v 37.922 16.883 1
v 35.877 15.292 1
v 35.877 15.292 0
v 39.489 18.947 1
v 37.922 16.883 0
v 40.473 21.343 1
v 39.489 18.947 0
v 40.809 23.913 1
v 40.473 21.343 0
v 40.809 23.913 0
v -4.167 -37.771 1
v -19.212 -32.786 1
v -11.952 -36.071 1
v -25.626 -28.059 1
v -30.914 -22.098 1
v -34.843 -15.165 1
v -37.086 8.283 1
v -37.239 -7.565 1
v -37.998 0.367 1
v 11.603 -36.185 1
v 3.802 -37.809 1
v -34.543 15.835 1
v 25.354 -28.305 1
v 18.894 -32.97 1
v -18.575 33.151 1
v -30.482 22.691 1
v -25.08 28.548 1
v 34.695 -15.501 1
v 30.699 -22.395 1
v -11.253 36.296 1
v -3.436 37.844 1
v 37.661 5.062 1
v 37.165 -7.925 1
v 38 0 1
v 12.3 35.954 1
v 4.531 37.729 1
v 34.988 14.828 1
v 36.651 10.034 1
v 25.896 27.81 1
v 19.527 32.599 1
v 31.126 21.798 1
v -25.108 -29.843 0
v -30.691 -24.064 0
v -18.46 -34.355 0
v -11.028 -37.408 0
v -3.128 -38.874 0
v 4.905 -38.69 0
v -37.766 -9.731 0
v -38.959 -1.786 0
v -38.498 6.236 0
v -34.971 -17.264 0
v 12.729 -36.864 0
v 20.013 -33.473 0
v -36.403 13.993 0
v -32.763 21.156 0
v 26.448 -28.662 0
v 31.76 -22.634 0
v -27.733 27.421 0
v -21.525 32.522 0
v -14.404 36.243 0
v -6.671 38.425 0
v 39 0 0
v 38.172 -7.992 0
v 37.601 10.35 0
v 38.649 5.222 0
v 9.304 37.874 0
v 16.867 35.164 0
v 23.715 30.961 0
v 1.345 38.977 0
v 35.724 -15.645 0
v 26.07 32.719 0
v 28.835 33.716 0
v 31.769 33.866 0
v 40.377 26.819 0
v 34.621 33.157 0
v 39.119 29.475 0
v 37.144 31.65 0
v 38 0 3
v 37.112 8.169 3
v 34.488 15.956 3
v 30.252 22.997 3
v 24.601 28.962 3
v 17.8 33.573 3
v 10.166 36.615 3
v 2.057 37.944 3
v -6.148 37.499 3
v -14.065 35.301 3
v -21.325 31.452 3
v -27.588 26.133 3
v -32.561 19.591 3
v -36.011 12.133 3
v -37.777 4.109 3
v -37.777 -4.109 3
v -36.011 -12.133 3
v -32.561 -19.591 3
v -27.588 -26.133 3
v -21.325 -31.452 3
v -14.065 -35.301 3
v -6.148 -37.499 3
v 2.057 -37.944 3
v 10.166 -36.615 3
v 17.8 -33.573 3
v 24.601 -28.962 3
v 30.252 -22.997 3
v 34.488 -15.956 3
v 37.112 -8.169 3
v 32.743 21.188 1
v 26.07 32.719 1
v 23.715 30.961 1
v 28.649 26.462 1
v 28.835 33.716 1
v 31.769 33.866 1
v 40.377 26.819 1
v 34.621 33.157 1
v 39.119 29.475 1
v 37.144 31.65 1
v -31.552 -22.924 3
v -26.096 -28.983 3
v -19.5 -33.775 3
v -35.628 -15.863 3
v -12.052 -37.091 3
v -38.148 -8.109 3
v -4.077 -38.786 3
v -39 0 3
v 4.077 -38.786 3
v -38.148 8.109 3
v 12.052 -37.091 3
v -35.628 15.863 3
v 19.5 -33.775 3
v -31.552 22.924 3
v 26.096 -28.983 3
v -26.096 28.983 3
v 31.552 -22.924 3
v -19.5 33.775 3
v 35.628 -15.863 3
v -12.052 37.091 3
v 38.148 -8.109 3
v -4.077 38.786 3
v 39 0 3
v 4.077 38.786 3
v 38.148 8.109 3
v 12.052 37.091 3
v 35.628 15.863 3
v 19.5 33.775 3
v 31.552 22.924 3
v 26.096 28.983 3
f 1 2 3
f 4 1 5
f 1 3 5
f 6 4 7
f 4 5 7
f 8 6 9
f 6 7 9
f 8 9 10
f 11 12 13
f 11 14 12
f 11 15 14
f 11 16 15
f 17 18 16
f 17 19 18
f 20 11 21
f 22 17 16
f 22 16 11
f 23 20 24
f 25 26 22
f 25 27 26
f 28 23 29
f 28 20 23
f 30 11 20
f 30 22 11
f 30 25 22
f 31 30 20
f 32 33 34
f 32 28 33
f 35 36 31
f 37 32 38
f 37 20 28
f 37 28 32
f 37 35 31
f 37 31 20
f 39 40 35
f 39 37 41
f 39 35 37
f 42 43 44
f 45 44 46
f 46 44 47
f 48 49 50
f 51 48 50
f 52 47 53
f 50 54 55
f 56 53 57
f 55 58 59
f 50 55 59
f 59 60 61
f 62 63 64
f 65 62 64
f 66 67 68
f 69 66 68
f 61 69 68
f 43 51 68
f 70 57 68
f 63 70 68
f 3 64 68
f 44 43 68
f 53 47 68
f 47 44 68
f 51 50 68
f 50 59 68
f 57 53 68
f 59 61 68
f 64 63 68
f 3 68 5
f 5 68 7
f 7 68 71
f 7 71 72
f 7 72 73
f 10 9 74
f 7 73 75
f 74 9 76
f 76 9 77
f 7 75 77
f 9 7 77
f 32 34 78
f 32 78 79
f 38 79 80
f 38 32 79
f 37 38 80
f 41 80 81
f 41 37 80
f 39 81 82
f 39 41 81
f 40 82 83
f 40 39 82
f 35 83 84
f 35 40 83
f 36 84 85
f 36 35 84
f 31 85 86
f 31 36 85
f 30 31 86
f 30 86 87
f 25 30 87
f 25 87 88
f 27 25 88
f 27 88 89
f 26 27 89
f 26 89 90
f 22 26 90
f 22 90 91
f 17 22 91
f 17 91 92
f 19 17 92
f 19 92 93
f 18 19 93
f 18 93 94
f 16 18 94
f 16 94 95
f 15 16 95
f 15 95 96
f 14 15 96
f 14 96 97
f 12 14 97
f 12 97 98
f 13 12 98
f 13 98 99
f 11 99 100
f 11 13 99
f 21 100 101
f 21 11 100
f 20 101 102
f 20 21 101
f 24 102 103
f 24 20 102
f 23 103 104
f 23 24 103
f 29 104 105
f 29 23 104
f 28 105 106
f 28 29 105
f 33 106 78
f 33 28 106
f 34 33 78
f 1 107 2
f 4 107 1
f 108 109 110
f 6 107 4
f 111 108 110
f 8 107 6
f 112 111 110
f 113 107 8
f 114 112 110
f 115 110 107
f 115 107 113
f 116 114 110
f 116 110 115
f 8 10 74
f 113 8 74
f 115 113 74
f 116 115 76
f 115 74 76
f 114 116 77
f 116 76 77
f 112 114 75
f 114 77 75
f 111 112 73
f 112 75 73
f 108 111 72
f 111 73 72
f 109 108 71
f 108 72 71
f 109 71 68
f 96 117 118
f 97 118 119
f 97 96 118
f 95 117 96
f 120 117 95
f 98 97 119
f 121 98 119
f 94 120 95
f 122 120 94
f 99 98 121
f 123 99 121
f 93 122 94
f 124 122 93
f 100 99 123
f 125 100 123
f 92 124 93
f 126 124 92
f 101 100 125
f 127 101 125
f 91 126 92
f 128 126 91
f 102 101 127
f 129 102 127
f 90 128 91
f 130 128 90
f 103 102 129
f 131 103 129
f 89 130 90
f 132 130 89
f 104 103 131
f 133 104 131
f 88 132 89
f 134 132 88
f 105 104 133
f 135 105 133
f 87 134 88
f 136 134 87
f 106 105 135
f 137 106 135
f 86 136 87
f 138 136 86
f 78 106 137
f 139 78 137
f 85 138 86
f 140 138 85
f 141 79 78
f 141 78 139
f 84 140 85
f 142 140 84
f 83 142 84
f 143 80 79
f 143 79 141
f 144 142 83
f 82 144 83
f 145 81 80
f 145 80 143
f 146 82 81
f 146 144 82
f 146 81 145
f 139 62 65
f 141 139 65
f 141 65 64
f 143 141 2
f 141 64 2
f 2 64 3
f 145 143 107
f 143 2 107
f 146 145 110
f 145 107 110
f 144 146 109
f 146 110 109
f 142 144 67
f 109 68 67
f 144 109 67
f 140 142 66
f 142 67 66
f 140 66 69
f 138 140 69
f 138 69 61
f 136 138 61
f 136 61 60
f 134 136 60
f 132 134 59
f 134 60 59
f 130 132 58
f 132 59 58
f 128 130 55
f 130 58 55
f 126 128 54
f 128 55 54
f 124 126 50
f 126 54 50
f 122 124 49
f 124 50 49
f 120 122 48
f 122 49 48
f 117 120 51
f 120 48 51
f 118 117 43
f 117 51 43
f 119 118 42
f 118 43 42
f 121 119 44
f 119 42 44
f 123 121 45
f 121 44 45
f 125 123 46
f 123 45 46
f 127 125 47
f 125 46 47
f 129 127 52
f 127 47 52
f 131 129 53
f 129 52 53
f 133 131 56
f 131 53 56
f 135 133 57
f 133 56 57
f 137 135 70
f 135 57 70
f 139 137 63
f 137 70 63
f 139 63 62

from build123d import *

# Parameters (mm, degrees)
F0_R     = 38
F2_DEPTH = 1
F1_R     = 39
F1_R_2   = 38
F3_DEPTH = 3
F5_DEPTH = 1


with BuildPart() as f2:
    # F0 (on Top) → F2 (new body)
    with BuildSketch(Plane.XY):
        Circle(F0_R)
    extrude(amount=F2_DEPTH)

    # F1 (on face) → F3 (join)
    with BuildSketch(Plane.XY):
        Circle(F1_R)
        Circle(F1_R_2, mode=Mode.SUBTRACT)
    extrude(amount=F3_DEPTH)

    # F4 (on face) → F5 (join)
    with BuildSketch(Plane.XY):
        with BuildLine():
            ThreePointArc((34.987762, 14.827558), (39.228789, 18.517583), (40.808919, 23.91256))
            ThreePointArc((40.808919, 23.91256), (34.152493, 33.337024), (23.044816, 30.214838))
            ThreePointArc((23.044816, 30.214838), (30.018946, 23.299418), (34.987762, 14.827558))
        make_face()
    extrude(amount=F5_DEPTH)


solid = f2.part
